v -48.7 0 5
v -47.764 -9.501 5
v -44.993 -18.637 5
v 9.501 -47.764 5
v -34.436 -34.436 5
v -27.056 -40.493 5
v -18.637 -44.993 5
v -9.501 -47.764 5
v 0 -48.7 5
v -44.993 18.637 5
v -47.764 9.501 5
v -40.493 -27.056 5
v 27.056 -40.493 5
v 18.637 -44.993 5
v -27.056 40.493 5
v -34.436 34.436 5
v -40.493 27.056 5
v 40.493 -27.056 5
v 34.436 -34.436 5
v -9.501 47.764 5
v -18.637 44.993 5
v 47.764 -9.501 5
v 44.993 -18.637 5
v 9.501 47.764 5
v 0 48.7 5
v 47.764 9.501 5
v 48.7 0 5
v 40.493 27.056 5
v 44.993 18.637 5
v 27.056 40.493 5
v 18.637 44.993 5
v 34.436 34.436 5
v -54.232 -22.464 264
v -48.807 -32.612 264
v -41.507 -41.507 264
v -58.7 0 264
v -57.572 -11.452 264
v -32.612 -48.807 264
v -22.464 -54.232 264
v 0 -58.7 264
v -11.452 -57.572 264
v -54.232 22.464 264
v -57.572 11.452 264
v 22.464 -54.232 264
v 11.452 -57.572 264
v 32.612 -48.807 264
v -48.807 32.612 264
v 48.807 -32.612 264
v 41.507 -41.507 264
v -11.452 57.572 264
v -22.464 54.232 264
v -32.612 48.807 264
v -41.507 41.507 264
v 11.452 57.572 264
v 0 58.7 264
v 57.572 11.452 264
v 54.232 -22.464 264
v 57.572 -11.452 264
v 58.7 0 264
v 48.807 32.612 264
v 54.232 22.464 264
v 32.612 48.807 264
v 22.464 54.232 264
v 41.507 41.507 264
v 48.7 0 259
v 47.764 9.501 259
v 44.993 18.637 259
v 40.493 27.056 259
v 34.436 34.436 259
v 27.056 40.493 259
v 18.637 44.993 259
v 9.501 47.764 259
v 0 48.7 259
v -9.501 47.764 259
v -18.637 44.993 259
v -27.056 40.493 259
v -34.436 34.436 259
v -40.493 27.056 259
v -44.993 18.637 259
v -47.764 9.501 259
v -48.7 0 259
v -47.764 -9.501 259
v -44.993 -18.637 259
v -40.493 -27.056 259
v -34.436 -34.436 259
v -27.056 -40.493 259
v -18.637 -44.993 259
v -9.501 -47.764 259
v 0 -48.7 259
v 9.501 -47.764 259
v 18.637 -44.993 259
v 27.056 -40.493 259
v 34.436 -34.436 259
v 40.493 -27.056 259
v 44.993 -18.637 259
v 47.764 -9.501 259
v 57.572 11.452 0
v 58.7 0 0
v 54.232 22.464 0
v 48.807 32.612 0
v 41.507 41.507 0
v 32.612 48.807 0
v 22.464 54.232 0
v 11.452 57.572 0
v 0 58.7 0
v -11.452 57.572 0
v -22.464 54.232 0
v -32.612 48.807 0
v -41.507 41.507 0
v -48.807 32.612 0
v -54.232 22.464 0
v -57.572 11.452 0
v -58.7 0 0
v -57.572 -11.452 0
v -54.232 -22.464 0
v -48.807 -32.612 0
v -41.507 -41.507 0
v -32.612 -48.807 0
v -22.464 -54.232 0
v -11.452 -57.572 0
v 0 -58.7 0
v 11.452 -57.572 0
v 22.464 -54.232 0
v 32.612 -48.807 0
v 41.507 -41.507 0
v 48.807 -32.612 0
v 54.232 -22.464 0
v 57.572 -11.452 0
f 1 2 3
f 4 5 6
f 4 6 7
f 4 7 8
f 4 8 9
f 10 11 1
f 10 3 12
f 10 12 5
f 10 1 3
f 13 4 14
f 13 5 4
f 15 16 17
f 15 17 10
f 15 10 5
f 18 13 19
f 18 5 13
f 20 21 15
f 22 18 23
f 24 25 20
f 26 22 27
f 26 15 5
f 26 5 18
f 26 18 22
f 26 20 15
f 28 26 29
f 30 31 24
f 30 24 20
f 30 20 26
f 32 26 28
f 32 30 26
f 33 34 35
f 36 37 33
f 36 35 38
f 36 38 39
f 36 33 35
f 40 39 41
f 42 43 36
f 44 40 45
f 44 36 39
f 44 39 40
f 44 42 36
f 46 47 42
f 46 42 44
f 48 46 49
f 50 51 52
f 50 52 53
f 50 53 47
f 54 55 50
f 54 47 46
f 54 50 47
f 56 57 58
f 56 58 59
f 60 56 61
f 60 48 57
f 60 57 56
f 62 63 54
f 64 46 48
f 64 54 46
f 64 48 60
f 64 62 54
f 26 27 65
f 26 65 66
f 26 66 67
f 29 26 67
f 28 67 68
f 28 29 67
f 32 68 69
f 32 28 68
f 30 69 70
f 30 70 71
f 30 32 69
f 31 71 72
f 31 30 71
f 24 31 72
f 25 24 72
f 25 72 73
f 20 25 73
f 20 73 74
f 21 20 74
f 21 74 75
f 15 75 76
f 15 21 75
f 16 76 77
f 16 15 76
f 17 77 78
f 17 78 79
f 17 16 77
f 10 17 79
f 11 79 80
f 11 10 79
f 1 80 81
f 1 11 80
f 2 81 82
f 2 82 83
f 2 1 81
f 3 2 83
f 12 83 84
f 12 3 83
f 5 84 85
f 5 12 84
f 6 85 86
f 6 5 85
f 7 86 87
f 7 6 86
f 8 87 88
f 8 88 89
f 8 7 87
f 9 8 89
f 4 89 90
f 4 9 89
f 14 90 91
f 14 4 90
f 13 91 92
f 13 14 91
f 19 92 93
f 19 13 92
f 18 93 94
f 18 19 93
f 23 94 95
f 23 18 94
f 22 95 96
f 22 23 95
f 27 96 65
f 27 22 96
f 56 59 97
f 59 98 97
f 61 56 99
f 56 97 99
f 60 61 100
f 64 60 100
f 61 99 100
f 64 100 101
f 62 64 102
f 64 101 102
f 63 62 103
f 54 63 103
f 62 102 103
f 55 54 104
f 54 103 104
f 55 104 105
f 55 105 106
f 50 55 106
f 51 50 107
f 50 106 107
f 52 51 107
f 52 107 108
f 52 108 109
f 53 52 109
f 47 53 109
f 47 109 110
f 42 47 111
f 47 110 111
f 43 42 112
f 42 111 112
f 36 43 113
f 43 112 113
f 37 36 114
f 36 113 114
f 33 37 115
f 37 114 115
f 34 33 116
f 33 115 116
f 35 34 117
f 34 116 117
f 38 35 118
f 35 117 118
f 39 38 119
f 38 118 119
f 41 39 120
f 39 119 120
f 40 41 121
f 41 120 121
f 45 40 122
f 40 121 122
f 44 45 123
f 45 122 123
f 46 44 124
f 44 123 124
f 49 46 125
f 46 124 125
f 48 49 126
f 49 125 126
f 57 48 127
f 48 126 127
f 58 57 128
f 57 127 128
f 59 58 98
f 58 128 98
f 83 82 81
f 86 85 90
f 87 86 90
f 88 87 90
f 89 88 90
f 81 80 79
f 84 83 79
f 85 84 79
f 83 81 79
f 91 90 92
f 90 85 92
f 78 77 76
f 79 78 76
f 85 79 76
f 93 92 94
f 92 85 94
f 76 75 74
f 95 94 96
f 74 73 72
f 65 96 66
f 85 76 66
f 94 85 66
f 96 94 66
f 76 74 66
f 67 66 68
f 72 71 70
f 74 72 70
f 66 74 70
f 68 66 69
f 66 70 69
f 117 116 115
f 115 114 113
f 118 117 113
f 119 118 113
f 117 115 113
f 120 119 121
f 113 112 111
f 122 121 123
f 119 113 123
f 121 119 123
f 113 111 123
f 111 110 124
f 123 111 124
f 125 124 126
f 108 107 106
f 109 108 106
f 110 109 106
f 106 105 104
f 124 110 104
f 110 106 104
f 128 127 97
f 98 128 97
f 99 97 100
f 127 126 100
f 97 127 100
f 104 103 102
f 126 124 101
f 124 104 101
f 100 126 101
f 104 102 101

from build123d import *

# Parameters (mm, degrees)
SCHIZZO1_R                   = 58.7
ESTRUSIONE_ESTRUSIONE1_DEPTH = 5
SCHIZZO2_R                   = 58.7
SCHIZZO2_R_2                 = 48.7
ESTRUSIONE_ESTRUSIONE2_DEPTH = 254
SCHIZZO3_R                   = 58.7
ESTRUSIONE_ESTRUSIONE3_DEPTH = 5


with BuildPart() as part:
    # Schizzo1 → Estrusione-Estrusione1 (new body)
    with BuildSketch(Plane.XY):
        Circle(SCHIZZO1_R)
    extrude(amount=ESTRUSIONE_ESTRUSIONE1_DEPTH)

    # Schizzo2 → Estrusione-Estrusione2 (add)
    with BuildSketch(Plane.XY.offset(5)):
        Circle(SCHIZZO2_R)
        Circle(SCHIZZO2_R_2, mode=Mode.SUBTRACT)
    extrude(amount=ESTRUSIONE_ESTRUSIONE2_DEPTH)

    # Schizzo3 → Estrusione-Estrusione3 (add)
    with BuildSketch(Plane.XY.offset(259)):
        Circle(SCHIZZO3_R)
    extrude(amount=ESTRUSIONE_ESTRUSIONE3_DEPTH)


solid = part.part
